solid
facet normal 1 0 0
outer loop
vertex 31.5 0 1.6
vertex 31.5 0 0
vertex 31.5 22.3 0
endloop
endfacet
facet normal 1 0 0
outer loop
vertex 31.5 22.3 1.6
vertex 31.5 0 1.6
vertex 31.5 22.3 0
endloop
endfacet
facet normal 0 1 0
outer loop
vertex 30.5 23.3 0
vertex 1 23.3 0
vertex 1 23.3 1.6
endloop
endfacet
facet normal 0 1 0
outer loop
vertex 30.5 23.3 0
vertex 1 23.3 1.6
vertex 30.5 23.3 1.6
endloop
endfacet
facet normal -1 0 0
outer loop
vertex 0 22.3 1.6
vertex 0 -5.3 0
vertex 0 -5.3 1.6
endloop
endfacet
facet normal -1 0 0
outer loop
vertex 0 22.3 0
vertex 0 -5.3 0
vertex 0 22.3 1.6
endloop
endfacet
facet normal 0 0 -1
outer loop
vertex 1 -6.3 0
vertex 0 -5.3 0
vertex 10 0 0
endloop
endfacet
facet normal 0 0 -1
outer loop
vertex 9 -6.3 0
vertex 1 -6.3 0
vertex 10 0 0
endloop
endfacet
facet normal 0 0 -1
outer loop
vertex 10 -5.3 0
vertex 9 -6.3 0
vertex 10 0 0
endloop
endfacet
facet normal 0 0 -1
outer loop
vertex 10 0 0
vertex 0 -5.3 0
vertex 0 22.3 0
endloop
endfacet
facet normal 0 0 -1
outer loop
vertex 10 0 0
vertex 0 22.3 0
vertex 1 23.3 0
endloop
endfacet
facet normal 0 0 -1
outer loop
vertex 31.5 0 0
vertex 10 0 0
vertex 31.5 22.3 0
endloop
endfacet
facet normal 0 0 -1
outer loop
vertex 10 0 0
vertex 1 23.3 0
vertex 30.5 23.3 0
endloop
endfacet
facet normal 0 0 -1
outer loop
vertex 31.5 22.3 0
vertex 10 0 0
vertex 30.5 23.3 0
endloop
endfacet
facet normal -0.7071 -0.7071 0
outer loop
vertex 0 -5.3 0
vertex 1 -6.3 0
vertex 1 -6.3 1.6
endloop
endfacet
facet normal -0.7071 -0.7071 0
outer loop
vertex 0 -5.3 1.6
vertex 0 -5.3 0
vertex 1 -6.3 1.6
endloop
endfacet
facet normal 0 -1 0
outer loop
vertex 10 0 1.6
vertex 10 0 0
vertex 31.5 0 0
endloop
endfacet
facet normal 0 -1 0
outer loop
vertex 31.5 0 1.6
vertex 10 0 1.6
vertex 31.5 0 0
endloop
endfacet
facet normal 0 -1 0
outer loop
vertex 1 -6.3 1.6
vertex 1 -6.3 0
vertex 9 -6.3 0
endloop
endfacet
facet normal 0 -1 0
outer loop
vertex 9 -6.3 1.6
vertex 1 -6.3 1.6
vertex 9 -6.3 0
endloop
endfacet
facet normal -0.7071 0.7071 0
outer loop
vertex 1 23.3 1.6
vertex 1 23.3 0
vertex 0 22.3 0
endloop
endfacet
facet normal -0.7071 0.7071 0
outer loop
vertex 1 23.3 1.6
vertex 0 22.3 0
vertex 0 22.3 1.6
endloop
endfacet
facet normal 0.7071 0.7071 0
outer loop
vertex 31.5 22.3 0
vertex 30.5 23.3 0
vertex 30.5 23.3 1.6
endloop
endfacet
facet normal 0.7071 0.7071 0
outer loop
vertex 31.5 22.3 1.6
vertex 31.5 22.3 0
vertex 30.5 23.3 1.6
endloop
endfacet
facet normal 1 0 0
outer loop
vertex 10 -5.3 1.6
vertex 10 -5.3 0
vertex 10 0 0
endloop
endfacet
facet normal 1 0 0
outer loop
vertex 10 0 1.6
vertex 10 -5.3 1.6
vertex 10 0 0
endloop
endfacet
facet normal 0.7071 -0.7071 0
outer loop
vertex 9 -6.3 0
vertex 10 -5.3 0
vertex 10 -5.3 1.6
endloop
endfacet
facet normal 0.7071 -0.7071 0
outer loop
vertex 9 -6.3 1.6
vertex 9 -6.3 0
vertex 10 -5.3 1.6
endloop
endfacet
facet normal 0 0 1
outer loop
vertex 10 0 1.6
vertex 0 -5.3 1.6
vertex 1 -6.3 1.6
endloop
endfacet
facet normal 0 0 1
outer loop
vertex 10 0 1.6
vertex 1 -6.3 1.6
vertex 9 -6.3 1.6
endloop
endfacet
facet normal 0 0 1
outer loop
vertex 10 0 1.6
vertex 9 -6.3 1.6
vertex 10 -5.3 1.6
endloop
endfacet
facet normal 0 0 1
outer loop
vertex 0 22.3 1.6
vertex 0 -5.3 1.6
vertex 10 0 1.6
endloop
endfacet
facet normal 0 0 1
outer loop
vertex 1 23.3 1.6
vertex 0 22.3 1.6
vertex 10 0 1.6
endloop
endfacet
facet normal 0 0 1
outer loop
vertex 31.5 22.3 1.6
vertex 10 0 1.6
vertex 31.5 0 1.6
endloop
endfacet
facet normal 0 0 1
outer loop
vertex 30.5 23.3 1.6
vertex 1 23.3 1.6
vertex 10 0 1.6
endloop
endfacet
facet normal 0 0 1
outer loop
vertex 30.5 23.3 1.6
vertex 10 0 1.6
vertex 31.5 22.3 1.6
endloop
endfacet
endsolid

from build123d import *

# Parameters (mm, degrees)
BOX002_W        = 31.5
BOX002_H        = 23.3
BOX002_DEPTH    = 1.6
CHAMFER001_SIZE = 1
BOX003_W        = 10
BOX003_H        = 6.3
BOX003_DEPTH    = 1.6
CHAMFER_SIZE    = 1


with BuildPart() as chamfer001:
    # Box002 → Box002 (new body)
    with BuildSketch(Plane.XY):
        with Locations((15.75, 11.65)):
            Rectangle(BOX002_W, BOX002_H)
    extrude(amount=BOX002_DEPTH)

    # Chamfer001
    chamfer001_edges = [chamfer001.edges().sort_by_distance(p)[0] for p in [
        (0, 23.3, 0.8),
        (31.5, 23.3, 0.8),
    ]]
    chamfer(chamfer001_edges, length=CHAMFER001_SIZE)


with BuildPart() as plaqueta:
    # Box003 → Box003 (new body)
    with BuildSketch(Plane(origin=(0, -6.3, 0), x_dir=(1, 0, 0), z_dir=(0, 0, 1))):
        with Locations((5, 3.15)):
            Rectangle(BOX003_W, BOX003_H)
    extrude(amount=BOX003_DEPTH)

    # Chamfer
    chamfer_edges = [plaqueta.edges().sort_by_distance(p)[0] for p in [
        (0, -6.3, 0.8),
        (10, -6.3, 0.8),
    ]]
    chamfer(chamfer_edges, length=CHAMFER_SIZE)

    # Fusion: union Chamfer001
    add(chamfer001.part)


solid = plaqueta.part
